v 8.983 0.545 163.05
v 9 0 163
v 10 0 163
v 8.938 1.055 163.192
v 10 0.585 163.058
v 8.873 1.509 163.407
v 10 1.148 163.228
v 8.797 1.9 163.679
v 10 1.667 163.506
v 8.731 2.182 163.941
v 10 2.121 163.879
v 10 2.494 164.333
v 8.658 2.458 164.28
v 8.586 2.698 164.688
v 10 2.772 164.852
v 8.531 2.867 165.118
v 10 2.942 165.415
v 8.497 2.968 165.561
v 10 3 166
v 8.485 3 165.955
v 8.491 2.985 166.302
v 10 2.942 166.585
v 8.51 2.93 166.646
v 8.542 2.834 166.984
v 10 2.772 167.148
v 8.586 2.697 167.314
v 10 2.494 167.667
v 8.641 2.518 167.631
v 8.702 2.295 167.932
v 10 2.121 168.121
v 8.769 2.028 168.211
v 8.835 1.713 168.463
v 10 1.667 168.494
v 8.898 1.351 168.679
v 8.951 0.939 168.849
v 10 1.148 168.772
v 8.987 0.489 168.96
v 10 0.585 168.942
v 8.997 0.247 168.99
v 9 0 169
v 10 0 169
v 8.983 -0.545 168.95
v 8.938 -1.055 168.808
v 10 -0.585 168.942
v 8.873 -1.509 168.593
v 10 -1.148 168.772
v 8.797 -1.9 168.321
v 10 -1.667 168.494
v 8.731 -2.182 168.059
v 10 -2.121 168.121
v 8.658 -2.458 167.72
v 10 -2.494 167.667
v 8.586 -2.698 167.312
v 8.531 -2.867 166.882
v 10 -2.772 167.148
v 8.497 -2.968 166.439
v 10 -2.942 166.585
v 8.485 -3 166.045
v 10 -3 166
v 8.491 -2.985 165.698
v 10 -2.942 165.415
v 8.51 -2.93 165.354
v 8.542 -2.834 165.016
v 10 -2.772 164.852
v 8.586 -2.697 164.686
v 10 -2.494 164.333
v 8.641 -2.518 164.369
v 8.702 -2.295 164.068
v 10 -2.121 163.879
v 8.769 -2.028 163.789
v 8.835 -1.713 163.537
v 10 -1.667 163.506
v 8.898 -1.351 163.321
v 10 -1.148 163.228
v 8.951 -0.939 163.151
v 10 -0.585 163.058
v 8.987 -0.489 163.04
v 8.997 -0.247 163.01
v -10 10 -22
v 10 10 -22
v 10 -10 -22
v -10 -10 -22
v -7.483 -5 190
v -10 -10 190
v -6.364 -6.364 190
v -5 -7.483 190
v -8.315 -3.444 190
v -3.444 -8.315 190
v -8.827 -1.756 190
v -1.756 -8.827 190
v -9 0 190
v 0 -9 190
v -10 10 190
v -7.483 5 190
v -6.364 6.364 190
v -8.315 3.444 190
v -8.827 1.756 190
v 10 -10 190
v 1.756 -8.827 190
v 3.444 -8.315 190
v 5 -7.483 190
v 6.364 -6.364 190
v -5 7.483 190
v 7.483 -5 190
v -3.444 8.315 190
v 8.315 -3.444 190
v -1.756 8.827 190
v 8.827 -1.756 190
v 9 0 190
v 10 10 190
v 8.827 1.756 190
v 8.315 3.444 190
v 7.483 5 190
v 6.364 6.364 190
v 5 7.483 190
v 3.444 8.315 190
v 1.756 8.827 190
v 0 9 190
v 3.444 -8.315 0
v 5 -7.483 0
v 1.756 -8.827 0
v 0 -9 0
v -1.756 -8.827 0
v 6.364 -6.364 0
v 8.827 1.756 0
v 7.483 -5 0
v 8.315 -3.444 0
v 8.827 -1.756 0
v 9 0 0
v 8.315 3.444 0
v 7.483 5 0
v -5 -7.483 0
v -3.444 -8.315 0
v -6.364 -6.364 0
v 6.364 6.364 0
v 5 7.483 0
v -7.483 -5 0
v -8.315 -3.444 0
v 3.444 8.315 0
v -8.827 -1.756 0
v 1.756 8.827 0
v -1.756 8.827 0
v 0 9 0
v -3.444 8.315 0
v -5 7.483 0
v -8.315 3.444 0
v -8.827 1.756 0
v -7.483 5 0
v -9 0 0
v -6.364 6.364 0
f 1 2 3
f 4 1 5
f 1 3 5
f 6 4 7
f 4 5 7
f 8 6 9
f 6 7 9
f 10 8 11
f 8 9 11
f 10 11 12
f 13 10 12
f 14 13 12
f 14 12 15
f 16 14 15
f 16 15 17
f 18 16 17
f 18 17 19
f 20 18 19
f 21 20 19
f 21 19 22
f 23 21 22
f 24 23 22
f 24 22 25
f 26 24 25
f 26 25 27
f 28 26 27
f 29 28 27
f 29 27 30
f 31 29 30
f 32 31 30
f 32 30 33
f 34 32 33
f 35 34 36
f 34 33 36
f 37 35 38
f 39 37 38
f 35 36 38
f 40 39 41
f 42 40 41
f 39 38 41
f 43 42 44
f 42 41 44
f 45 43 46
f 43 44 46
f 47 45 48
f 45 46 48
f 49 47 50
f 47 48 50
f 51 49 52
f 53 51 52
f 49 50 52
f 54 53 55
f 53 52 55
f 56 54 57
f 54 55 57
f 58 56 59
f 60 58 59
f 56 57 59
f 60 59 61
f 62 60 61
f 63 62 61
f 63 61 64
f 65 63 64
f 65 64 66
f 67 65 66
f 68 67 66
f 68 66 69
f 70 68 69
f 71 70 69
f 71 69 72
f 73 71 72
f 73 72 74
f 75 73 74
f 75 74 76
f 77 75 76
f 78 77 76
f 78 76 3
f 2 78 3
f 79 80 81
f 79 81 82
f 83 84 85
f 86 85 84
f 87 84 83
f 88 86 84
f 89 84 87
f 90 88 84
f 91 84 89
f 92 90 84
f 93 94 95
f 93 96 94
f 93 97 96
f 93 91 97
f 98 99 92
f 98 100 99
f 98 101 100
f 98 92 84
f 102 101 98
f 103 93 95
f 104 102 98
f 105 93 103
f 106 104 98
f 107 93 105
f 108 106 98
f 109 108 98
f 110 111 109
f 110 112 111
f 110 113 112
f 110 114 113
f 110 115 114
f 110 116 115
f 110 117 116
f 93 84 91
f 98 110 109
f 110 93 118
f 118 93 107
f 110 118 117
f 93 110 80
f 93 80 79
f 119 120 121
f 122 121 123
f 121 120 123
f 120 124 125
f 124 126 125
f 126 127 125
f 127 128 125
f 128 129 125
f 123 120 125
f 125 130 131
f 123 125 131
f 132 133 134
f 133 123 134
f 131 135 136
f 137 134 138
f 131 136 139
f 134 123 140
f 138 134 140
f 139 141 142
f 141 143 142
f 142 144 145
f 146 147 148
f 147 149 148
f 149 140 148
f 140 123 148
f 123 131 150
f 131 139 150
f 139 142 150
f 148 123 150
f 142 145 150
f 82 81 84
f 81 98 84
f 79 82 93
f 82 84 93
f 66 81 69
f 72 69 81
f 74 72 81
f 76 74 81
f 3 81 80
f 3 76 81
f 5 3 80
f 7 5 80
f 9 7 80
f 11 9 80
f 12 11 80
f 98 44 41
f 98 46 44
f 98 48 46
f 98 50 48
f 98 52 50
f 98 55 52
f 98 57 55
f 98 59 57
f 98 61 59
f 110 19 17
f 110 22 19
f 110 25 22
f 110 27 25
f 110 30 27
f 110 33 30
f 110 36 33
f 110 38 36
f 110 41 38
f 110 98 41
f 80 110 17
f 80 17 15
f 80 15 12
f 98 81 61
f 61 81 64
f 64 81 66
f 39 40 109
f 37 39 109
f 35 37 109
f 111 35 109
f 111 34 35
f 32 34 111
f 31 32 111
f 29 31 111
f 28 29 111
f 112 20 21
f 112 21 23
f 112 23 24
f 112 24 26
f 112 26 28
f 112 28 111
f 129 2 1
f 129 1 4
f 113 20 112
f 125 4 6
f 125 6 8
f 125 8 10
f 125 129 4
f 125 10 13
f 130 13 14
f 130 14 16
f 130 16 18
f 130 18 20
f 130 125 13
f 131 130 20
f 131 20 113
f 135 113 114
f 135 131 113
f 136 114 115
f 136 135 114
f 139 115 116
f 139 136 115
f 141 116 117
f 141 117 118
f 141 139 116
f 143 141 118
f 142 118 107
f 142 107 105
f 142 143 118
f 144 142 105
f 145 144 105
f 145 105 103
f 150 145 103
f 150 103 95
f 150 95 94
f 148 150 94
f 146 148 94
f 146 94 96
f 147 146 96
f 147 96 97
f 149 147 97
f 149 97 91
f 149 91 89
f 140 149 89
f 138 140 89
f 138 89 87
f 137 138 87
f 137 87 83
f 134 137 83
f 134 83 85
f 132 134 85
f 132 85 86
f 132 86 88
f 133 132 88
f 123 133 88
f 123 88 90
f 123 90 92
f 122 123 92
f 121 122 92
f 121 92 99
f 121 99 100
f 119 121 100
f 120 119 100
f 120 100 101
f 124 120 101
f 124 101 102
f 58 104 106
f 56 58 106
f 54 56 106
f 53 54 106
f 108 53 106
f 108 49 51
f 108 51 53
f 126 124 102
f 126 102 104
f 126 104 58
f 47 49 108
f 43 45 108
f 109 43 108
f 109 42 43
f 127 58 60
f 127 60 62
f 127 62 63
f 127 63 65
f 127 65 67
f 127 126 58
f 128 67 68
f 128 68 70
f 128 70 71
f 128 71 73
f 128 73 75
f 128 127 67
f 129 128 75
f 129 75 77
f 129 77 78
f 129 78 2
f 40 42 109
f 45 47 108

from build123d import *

# Parameters (mm, degrees)
SKETCH_1_W          = 20
SKETCH_1_H          = 20
SKETCH_1_R          = 9
EXTRUDE_1_DEPTH     = 190
SKETCH_2_W          = 20
SKETCH_2_H          = 20
EXTRUDE_2_DEPTH     = 22
SKETCH_4_R          = 3
CUT_EXTRUDE_2_DEPTH = 10


with BuildPart() as part:
    # 草图1 → 凸台-拉伸1 (new body)
    with BuildSketch(Plane.XY):
        Rectangle(SKETCH_1_W, SKETCH_1_H)
        Circle(SKETCH_1_R, mode=Mode.SUBTRACT)
    extrude(amount=EXTRUDE_1_DEPTH)

    # 草图2 → 凸台-拉伸2 (add)
    with BuildSketch(Plane(origin=(0, 0, 0), x_dir=(-1, 0, 0), z_dir=(0, 0, -1))):
        Rectangle(SKETCH_2_W, SKETCH_2_H)
    extrude(amount=EXTRUDE_2_DEPTH)

    # 草图4 → 切除-拉伸2 (cut)
    with BuildSketch(Plane(origin=(10, 0, 0), x_dir=(0, 0, -1), z_dir=(1, 0, 0))):
        with Locations((-166, 0)):
            Circle(SKETCH_4_R)
    extrude(amount=-CUT_EXTRUDE_2_DEPTH, mode=Mode.SUBTRACT)


solid = part.part
